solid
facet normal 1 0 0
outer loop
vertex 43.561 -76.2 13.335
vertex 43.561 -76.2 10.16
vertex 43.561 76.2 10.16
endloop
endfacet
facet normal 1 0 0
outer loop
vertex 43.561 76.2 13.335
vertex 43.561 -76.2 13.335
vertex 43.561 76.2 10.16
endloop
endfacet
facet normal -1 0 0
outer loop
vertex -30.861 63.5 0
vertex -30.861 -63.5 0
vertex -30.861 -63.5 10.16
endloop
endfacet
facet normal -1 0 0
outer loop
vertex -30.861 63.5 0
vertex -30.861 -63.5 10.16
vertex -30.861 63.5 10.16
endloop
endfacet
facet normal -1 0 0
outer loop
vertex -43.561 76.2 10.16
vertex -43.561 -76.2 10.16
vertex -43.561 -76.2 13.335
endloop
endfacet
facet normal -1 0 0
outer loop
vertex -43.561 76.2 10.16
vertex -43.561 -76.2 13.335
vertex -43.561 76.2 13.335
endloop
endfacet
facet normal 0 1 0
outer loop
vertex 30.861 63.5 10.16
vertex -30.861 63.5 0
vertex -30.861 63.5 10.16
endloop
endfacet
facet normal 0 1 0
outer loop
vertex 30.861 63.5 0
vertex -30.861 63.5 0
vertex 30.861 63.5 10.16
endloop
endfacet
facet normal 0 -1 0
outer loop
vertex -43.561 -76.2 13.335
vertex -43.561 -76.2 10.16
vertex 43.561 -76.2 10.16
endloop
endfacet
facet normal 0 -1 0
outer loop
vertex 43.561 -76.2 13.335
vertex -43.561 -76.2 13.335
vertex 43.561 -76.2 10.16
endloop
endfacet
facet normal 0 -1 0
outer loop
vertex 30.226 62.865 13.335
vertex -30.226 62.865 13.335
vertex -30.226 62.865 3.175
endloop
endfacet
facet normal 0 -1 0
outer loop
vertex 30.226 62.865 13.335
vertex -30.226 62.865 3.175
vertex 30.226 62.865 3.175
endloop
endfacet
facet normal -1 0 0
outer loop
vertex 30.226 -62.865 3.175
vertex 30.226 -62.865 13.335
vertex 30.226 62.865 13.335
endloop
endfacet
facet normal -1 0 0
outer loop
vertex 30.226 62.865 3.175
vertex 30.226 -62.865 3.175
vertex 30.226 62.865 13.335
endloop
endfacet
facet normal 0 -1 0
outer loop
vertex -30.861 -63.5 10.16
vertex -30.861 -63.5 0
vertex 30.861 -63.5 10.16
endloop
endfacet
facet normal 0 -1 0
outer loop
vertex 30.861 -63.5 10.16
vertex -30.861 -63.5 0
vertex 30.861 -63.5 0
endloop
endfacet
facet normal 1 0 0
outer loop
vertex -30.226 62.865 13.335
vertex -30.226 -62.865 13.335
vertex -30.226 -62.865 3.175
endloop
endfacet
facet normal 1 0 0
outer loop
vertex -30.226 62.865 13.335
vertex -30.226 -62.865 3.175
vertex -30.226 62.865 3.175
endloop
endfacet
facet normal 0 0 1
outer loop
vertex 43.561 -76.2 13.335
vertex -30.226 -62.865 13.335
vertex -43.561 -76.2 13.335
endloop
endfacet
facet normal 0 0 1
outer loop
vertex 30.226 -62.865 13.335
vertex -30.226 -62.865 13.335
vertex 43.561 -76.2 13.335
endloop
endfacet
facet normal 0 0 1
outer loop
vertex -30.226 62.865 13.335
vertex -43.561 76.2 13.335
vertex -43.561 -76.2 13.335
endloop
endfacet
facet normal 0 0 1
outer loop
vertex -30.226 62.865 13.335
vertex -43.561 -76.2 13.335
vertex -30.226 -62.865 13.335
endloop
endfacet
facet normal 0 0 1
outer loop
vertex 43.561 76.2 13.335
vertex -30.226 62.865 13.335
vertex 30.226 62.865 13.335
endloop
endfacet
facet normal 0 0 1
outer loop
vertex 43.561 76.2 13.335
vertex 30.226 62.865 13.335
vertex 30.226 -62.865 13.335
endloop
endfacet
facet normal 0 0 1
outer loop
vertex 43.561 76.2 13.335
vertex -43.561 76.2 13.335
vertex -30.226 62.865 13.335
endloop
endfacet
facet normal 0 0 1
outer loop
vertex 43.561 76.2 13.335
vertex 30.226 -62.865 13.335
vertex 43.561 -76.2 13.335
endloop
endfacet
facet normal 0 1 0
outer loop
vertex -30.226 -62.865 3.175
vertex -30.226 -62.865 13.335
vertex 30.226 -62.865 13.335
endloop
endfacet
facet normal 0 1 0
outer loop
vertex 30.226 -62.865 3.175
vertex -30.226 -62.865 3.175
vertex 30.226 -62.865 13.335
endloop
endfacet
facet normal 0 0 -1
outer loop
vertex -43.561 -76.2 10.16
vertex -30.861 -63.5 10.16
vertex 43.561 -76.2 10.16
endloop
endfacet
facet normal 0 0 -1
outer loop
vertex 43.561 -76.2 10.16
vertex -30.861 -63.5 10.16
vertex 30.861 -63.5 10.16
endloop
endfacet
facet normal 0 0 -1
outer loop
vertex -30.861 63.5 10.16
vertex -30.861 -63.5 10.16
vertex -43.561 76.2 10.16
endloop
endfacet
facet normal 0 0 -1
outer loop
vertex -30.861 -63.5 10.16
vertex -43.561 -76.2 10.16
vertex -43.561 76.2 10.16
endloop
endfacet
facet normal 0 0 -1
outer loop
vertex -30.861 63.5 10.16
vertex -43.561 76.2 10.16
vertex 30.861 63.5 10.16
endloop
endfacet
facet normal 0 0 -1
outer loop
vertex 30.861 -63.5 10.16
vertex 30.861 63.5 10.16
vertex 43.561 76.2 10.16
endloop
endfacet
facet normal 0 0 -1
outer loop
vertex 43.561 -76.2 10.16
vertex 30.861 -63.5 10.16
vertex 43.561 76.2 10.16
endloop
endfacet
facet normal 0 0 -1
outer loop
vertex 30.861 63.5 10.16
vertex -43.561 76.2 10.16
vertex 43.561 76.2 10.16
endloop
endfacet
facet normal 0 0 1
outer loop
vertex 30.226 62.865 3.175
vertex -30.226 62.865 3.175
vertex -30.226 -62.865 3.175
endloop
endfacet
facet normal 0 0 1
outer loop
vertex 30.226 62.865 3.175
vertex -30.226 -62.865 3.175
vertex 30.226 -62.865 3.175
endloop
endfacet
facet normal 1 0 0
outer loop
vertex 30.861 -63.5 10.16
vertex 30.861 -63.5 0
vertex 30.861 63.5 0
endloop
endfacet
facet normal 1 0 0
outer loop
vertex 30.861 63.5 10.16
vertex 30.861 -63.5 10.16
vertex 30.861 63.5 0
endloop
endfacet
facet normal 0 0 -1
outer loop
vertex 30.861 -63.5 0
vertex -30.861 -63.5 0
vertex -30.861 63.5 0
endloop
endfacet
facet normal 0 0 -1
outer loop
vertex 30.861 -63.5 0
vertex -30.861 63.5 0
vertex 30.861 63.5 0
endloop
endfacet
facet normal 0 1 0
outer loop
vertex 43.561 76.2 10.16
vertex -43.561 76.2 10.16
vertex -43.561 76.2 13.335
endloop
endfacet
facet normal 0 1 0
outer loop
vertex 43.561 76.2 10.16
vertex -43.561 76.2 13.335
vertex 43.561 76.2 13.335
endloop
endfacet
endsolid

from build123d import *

# Parameters (mm, degrees)
F0_W     = 61.722
F0_H     = 127
F1_DEPTH = 10.16
F2_W     = 87.122
F2_H     = 152.4
F3_DEPTH = 3.175
F4_W     = 60.452
F4_H     = 125.73
F5_DEPTH = 10.16


with BuildPart() as f1:
    # F0 (on Top) → F1 (new body)
    with BuildSketch(Plane.XY):
        Rectangle(F0_W, F0_H)
    extrude(amount=F1_DEPTH)

    # F2 (on face) → F3 (join)
    with BuildSketch(Plane.XY.offset(10.16)):
        Rectangle(F2_W, F2_H)
    extrude(amount=F3_DEPTH)

    # F4 (on face) → F5 (cut)
    with BuildSketch(Plane.XY.offset(13.335)):
        Rectangle(F4_W, F4_H)
    extrude(amount=-F5_DEPTH, mode=Mode.SUBTRACT)


solid = f1.part
